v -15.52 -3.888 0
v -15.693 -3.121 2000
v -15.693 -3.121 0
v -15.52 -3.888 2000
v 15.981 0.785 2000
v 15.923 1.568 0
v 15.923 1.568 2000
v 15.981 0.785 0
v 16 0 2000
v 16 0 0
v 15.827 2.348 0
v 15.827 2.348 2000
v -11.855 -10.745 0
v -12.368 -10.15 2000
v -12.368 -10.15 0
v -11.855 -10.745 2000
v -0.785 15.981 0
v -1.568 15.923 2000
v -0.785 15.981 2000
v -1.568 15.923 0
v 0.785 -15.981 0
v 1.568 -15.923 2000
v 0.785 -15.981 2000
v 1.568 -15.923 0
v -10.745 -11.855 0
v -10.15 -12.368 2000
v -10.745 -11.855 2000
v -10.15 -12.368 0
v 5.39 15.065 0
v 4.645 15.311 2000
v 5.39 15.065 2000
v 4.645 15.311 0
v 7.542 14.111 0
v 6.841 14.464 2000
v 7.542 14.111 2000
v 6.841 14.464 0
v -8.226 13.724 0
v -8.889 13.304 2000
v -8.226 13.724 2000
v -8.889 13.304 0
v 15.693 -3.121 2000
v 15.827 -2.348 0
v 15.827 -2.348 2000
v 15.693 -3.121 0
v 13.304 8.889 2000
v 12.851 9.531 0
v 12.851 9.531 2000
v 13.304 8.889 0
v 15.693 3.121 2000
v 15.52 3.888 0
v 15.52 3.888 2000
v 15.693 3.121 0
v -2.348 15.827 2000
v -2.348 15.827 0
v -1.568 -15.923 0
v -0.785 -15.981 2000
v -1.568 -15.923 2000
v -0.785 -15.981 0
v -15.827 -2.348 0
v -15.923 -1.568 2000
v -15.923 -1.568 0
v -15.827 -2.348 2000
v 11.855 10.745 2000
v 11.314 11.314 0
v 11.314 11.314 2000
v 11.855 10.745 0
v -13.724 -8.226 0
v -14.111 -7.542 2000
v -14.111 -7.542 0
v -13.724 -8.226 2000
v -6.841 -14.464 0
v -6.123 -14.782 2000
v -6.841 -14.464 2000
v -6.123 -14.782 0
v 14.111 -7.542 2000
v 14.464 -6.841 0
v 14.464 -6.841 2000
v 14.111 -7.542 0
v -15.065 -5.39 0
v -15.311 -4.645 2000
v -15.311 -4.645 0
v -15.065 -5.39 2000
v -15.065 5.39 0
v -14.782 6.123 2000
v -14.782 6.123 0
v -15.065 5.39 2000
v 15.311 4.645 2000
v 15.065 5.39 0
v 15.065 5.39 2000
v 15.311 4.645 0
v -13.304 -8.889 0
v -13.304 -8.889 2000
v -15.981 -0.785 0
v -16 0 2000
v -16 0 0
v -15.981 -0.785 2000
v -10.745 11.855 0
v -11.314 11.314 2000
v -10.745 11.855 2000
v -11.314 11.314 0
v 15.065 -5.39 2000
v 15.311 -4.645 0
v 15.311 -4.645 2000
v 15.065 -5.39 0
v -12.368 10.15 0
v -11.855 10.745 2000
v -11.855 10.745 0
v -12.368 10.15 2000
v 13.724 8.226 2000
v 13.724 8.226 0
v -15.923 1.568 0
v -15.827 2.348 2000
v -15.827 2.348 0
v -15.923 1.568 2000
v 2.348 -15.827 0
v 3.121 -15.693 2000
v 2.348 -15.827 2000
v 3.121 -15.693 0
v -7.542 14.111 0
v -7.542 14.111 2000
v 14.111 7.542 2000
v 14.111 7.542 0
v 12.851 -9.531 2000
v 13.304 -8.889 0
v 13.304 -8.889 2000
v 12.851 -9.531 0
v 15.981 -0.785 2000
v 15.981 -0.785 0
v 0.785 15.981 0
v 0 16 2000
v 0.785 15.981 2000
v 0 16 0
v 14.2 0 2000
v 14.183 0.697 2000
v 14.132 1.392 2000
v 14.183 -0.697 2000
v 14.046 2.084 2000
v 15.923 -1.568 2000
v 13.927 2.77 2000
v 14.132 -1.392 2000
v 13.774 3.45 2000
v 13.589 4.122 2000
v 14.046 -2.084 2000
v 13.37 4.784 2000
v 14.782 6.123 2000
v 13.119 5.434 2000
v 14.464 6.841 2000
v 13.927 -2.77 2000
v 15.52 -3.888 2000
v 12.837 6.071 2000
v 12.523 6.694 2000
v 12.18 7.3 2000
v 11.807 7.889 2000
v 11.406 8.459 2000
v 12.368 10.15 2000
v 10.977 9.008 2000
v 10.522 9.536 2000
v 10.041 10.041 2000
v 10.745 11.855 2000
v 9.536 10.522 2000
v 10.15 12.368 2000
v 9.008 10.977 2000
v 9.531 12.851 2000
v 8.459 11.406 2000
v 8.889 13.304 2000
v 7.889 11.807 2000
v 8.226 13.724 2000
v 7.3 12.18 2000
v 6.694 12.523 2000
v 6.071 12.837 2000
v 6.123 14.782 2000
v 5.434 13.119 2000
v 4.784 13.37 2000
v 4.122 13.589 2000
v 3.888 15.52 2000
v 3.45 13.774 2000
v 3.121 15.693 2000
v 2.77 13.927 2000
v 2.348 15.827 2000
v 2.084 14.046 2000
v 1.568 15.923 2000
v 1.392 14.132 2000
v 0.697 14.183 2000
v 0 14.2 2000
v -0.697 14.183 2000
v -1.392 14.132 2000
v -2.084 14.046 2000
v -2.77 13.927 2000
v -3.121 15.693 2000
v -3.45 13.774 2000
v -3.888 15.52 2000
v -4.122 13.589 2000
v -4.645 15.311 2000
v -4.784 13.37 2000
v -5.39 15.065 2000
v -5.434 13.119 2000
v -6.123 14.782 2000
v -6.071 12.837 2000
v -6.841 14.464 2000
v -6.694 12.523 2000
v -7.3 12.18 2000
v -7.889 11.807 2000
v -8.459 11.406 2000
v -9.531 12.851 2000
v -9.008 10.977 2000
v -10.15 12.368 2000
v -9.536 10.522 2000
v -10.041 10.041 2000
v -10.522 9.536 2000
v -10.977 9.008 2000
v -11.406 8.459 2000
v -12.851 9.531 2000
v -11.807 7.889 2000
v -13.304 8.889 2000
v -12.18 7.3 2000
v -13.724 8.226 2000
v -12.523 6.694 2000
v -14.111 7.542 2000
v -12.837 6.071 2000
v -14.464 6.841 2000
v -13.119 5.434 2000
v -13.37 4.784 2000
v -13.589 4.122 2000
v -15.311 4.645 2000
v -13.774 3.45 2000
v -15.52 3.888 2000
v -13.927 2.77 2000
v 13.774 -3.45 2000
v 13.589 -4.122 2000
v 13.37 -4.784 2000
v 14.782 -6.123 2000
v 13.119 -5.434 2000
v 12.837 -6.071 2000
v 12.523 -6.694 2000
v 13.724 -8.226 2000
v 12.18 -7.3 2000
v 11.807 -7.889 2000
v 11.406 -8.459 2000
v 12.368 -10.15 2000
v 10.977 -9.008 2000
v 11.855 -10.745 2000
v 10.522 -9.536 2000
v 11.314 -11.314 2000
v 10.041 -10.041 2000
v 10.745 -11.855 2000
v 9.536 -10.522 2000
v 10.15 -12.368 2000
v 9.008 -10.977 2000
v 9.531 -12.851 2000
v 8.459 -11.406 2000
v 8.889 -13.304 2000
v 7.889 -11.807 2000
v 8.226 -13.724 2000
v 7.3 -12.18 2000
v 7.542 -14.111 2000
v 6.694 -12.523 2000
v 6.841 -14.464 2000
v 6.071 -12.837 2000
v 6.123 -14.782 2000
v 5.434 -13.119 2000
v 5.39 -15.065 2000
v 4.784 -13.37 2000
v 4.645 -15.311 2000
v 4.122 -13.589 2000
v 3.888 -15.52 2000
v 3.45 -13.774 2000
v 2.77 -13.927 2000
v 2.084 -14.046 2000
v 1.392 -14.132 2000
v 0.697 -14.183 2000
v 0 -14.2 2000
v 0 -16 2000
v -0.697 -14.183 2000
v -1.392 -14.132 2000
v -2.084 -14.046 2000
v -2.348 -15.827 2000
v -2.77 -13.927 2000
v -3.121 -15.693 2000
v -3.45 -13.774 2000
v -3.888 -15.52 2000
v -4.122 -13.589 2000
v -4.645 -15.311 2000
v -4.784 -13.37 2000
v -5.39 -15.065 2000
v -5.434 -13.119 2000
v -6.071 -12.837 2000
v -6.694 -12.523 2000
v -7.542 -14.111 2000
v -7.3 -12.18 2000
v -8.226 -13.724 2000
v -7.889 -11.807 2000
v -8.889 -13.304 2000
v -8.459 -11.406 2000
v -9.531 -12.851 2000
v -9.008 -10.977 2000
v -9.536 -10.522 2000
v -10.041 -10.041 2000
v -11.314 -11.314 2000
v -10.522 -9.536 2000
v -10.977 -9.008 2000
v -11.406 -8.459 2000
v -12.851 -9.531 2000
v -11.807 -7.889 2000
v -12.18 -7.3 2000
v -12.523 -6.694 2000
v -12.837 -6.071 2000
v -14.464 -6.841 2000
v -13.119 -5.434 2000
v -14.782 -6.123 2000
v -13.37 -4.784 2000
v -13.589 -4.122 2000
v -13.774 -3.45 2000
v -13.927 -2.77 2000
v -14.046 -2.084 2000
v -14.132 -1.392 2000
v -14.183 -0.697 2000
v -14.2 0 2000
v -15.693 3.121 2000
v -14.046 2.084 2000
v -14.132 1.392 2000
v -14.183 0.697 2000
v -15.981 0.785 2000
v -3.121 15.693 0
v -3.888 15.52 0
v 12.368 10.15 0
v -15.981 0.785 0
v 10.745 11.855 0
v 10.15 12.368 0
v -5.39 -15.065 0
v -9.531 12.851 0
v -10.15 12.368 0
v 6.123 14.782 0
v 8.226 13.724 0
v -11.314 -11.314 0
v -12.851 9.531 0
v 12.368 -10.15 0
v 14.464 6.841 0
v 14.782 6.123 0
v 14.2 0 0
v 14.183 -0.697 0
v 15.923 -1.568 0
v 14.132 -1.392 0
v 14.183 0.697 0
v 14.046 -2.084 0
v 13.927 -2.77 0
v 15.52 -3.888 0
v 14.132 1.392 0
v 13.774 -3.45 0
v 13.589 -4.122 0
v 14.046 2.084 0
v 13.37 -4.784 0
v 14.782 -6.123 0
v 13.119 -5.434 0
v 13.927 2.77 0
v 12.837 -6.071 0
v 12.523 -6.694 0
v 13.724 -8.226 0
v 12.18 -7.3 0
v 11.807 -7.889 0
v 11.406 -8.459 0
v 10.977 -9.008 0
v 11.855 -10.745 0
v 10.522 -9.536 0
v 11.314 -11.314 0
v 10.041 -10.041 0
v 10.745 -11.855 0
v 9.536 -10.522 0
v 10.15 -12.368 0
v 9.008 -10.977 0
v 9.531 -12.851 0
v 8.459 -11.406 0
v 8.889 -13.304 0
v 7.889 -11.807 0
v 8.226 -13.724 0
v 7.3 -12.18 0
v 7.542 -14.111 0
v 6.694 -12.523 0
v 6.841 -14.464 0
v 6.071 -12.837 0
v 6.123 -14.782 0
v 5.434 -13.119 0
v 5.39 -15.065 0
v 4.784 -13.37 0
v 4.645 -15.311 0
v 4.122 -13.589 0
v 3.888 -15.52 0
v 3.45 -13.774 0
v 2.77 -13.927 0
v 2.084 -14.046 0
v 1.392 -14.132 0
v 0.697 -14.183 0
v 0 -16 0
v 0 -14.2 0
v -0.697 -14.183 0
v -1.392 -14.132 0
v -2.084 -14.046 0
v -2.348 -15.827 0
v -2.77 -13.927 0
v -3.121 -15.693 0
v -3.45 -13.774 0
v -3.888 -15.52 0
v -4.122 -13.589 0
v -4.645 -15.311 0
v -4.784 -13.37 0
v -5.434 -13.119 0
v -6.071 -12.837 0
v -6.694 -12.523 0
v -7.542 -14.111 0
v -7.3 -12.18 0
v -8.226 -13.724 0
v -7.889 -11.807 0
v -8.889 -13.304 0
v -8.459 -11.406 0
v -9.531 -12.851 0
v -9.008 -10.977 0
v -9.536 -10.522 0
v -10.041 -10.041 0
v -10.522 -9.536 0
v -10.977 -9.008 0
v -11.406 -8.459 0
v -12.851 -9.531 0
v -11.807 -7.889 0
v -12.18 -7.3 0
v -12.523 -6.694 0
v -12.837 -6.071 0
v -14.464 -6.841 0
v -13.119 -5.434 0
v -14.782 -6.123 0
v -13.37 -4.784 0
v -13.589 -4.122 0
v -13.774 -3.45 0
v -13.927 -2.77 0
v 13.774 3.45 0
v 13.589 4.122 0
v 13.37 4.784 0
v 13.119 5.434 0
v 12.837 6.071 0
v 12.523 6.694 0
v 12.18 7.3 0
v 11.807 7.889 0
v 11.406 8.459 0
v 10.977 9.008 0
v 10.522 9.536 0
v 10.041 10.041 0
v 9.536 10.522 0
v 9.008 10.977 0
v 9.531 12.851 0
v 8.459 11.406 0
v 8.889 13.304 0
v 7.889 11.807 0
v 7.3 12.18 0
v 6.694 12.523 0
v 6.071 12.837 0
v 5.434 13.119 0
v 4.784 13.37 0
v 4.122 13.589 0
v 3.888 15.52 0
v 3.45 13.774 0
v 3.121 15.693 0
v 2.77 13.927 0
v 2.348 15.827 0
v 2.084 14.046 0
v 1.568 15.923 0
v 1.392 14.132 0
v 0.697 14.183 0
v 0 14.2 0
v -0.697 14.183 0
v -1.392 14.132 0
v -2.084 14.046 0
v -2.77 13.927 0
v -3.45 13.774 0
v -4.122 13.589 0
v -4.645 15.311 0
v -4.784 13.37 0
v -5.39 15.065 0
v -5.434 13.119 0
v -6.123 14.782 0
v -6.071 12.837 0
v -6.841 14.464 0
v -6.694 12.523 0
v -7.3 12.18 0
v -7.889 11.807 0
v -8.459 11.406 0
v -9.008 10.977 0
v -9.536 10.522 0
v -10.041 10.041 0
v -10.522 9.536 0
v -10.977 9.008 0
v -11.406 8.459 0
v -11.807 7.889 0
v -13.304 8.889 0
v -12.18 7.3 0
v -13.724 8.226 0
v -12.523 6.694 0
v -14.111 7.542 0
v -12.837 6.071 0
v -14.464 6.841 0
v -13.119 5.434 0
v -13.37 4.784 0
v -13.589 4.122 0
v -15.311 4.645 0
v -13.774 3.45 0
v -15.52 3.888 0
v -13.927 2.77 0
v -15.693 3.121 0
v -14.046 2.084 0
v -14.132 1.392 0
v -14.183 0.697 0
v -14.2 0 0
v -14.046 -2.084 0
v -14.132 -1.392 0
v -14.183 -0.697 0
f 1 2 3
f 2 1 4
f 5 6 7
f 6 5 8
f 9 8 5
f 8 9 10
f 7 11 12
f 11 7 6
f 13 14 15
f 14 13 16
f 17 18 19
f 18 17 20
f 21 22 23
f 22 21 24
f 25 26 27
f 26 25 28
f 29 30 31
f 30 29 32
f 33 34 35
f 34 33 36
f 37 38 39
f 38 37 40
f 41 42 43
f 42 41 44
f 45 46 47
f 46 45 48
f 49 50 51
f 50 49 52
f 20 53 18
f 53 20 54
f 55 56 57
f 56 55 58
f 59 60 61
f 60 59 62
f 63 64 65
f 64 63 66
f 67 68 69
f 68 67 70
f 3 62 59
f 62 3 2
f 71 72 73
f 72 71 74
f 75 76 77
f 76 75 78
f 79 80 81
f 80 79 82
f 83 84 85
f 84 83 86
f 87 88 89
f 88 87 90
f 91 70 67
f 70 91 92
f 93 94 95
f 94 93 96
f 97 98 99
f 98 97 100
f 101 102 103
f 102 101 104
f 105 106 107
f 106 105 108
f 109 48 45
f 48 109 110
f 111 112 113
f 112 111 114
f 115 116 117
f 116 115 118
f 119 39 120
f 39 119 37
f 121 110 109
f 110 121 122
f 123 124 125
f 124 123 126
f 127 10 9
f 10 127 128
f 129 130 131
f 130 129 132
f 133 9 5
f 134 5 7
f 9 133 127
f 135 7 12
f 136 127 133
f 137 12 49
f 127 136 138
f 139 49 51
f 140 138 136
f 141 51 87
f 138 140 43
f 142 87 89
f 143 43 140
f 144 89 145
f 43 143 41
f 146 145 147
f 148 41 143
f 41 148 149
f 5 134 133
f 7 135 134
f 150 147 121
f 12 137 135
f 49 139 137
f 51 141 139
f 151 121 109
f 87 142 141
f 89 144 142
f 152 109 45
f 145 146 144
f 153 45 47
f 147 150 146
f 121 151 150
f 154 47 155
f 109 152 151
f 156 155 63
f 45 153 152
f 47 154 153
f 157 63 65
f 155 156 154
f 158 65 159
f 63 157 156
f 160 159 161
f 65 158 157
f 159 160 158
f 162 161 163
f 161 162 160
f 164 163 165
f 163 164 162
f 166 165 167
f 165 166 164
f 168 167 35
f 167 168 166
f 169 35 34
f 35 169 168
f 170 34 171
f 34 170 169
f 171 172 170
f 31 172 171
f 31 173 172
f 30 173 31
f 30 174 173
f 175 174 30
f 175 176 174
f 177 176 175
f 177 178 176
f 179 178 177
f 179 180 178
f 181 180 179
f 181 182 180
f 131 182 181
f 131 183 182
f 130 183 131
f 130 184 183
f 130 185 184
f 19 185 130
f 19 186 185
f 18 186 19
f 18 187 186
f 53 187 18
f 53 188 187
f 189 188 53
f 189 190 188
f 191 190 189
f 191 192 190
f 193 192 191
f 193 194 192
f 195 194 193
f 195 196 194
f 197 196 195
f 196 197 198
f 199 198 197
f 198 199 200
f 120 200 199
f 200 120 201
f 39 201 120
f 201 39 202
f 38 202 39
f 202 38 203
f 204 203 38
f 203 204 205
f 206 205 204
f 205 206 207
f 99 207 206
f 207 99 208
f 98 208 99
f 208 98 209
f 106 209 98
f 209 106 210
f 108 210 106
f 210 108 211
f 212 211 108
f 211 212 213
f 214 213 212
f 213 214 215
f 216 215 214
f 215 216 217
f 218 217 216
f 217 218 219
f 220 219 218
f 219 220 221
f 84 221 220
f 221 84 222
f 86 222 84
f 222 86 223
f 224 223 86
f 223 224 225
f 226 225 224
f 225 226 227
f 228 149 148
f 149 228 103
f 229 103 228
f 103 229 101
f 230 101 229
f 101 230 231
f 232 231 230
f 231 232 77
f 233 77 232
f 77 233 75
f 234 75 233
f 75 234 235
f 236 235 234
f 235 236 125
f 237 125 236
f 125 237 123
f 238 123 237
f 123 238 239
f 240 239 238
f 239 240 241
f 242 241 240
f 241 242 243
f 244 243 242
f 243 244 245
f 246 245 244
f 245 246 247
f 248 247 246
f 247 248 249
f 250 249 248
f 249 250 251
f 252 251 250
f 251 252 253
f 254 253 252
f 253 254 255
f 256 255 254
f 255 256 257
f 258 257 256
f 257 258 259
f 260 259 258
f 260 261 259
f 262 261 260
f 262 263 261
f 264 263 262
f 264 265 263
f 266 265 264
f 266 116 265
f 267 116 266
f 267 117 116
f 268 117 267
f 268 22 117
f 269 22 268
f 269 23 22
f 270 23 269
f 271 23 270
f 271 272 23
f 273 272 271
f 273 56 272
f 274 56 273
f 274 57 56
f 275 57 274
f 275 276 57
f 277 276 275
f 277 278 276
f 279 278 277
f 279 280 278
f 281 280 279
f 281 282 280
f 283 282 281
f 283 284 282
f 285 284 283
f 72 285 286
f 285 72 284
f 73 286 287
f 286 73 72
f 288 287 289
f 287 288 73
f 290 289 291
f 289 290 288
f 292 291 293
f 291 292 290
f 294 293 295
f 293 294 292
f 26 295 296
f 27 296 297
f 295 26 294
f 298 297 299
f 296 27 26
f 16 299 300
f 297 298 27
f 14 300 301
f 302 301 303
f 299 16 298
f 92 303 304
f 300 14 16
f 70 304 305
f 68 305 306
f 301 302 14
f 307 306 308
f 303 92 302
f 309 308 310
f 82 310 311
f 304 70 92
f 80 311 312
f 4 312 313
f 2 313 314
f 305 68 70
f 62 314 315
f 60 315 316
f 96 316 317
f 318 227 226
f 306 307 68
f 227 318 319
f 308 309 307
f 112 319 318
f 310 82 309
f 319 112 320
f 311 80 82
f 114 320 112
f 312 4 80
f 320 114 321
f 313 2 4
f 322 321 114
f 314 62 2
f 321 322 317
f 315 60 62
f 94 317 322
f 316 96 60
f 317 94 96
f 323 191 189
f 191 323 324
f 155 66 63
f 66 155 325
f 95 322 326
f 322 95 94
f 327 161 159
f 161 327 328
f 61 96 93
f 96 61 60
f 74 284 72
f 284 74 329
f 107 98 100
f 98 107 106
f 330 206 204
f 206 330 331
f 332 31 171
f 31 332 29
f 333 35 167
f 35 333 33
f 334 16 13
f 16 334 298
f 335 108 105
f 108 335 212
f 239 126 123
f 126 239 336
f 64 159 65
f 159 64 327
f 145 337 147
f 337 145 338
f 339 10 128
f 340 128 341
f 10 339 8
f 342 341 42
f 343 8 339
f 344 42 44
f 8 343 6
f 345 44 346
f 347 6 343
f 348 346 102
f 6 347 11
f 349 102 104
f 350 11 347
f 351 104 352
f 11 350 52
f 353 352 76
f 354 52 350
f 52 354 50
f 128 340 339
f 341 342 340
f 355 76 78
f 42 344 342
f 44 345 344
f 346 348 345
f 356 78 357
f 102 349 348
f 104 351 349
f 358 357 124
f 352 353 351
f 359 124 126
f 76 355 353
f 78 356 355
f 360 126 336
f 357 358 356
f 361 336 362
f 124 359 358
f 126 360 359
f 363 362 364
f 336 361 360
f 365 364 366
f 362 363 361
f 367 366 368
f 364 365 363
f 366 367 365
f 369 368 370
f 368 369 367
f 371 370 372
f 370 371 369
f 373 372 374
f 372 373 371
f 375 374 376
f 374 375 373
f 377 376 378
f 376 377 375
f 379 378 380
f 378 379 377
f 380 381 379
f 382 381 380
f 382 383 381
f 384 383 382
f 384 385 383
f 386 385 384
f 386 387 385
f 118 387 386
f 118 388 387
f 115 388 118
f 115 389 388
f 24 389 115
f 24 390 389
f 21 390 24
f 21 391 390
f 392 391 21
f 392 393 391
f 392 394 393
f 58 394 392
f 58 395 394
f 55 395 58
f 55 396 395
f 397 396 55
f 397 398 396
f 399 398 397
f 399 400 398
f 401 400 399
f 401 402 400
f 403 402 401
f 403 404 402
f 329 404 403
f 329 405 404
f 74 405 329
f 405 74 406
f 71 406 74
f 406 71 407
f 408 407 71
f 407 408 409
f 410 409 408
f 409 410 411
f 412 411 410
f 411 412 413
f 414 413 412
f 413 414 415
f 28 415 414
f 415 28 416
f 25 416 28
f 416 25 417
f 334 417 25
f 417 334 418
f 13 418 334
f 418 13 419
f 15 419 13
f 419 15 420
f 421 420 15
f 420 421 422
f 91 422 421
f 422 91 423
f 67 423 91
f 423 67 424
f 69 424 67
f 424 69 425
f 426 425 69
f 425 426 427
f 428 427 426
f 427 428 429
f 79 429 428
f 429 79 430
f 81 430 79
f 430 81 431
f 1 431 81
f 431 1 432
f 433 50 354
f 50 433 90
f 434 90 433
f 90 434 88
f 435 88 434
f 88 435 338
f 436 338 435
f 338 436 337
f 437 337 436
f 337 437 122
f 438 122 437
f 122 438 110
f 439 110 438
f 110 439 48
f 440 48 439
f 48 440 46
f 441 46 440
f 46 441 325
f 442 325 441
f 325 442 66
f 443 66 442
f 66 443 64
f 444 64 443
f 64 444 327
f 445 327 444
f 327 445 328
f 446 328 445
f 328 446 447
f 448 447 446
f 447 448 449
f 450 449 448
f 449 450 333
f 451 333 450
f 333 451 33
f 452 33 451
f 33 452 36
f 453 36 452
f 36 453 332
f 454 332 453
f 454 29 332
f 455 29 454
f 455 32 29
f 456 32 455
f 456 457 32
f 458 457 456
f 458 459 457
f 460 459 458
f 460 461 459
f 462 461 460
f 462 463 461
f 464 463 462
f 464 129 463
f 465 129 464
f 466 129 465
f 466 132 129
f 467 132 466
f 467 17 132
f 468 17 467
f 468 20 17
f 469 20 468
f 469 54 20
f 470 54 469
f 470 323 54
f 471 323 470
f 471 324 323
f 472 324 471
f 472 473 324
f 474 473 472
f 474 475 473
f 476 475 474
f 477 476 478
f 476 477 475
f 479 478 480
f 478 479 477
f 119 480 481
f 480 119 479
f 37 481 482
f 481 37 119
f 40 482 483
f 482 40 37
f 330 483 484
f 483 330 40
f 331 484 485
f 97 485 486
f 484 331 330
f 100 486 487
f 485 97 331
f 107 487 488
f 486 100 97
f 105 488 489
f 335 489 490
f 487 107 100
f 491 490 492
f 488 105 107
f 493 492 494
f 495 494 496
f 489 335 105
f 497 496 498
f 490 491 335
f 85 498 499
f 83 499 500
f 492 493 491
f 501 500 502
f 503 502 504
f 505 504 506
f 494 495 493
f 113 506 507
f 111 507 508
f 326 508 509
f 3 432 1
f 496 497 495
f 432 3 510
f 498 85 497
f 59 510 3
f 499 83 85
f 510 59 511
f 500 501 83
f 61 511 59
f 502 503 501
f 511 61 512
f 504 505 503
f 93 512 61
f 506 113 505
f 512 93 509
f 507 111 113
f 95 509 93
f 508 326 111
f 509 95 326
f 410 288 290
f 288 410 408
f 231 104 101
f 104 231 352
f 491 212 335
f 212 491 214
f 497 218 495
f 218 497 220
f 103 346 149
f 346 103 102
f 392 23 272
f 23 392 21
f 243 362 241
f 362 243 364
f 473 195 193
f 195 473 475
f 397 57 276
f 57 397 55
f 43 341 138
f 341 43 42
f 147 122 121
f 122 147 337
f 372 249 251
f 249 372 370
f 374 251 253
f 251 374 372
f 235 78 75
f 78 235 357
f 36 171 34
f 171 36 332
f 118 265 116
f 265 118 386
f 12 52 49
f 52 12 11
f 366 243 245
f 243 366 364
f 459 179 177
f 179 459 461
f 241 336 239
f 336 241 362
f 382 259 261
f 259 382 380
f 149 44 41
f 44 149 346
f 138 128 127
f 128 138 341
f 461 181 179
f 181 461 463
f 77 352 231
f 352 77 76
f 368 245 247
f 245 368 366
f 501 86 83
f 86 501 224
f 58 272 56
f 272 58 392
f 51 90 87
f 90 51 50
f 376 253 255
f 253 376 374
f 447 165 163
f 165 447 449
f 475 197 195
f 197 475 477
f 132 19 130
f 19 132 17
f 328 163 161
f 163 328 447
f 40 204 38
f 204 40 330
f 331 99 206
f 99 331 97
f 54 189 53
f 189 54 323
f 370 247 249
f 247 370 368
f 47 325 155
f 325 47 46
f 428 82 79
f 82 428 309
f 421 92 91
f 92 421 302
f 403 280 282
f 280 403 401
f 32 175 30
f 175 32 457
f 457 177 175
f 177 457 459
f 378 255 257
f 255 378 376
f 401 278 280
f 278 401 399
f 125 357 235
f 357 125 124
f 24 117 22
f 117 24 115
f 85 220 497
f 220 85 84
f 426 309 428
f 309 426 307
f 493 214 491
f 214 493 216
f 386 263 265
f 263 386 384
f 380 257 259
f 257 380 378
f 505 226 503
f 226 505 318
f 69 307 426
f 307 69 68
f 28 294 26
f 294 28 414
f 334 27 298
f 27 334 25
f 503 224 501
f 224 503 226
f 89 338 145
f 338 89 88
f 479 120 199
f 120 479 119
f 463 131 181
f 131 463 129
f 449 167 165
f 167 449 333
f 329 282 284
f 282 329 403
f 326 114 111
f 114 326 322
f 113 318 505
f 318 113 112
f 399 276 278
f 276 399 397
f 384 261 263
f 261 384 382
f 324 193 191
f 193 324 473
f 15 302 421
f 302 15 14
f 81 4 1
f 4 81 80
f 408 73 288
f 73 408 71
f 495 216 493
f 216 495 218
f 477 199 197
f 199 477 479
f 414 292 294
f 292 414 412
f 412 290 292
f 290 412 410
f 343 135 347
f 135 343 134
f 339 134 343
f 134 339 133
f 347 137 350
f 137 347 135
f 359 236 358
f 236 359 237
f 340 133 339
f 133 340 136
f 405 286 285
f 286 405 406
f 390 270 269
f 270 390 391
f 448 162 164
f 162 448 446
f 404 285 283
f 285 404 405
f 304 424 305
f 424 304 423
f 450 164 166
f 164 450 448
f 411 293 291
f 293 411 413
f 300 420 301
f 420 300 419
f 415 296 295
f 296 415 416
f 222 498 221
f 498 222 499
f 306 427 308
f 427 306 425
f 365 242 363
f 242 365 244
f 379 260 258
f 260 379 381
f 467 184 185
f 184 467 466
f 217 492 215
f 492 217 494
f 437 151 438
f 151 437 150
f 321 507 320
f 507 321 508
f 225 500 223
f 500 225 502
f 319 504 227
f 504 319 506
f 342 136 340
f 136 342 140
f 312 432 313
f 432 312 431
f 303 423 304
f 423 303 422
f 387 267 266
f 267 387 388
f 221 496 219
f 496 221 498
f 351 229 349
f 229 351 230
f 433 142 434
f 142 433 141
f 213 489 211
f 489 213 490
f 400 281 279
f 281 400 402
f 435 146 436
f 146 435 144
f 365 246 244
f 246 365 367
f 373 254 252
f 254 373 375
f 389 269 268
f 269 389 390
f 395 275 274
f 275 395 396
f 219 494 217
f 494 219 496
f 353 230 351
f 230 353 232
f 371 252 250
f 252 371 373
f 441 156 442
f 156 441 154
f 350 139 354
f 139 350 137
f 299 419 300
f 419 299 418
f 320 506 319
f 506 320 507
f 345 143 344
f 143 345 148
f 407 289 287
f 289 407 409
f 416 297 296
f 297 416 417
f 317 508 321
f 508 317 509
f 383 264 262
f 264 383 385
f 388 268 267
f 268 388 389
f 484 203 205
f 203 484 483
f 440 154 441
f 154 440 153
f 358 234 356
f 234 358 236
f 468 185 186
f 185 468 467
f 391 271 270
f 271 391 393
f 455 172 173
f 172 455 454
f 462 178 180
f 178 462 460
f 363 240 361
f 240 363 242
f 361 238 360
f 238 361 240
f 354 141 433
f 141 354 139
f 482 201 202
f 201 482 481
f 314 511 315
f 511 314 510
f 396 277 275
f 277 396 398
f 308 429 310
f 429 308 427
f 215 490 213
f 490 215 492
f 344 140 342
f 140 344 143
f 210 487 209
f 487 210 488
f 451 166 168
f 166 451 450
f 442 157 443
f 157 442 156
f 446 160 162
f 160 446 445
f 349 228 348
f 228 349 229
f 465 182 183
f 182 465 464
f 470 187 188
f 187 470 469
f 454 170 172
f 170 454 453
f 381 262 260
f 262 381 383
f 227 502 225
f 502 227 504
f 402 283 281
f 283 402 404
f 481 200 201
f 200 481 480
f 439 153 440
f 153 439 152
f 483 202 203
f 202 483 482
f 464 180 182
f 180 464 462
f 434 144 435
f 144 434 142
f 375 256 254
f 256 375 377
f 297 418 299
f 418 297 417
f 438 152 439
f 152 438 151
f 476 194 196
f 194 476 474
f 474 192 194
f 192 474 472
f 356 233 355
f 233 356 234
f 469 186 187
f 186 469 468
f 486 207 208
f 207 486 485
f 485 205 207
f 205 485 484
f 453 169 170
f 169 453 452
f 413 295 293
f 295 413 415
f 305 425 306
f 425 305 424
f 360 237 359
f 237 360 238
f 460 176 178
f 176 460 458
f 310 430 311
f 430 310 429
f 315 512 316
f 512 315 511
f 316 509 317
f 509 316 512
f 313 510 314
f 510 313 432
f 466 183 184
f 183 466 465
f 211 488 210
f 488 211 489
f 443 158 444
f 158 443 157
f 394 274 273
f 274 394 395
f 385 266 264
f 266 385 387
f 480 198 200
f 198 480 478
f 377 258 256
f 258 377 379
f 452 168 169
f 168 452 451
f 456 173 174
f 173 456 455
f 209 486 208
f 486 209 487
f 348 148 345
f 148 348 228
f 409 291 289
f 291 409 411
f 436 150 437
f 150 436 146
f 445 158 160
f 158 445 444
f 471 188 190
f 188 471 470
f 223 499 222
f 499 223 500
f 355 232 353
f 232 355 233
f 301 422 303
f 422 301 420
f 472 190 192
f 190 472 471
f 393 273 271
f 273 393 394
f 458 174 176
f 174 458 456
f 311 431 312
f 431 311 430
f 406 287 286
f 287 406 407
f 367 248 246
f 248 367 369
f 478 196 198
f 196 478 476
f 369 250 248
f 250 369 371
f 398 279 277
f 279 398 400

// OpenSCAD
$fn = 128;

// HT pipe parameters (approx. for HT 32)
pipe_length = 2000;          // mm
outer_diameter = 32;         // mm (nominal)
wall_thickness = 1.8;        // mm (typical for HT 32; adjust if needed)

inner_diameter = outer_diameter - 2*wall_thickness;

module ht_pipe(od, id, len) {
    difference() {
        cylinder(h = len, d = od, center = false);
        translate([0,0,-0.1])
            cylinder(h = len + 0.2, d = id, center = false);
    }
}

ht_pipe(outer_diameter, inner_diameter, pipe_length);
